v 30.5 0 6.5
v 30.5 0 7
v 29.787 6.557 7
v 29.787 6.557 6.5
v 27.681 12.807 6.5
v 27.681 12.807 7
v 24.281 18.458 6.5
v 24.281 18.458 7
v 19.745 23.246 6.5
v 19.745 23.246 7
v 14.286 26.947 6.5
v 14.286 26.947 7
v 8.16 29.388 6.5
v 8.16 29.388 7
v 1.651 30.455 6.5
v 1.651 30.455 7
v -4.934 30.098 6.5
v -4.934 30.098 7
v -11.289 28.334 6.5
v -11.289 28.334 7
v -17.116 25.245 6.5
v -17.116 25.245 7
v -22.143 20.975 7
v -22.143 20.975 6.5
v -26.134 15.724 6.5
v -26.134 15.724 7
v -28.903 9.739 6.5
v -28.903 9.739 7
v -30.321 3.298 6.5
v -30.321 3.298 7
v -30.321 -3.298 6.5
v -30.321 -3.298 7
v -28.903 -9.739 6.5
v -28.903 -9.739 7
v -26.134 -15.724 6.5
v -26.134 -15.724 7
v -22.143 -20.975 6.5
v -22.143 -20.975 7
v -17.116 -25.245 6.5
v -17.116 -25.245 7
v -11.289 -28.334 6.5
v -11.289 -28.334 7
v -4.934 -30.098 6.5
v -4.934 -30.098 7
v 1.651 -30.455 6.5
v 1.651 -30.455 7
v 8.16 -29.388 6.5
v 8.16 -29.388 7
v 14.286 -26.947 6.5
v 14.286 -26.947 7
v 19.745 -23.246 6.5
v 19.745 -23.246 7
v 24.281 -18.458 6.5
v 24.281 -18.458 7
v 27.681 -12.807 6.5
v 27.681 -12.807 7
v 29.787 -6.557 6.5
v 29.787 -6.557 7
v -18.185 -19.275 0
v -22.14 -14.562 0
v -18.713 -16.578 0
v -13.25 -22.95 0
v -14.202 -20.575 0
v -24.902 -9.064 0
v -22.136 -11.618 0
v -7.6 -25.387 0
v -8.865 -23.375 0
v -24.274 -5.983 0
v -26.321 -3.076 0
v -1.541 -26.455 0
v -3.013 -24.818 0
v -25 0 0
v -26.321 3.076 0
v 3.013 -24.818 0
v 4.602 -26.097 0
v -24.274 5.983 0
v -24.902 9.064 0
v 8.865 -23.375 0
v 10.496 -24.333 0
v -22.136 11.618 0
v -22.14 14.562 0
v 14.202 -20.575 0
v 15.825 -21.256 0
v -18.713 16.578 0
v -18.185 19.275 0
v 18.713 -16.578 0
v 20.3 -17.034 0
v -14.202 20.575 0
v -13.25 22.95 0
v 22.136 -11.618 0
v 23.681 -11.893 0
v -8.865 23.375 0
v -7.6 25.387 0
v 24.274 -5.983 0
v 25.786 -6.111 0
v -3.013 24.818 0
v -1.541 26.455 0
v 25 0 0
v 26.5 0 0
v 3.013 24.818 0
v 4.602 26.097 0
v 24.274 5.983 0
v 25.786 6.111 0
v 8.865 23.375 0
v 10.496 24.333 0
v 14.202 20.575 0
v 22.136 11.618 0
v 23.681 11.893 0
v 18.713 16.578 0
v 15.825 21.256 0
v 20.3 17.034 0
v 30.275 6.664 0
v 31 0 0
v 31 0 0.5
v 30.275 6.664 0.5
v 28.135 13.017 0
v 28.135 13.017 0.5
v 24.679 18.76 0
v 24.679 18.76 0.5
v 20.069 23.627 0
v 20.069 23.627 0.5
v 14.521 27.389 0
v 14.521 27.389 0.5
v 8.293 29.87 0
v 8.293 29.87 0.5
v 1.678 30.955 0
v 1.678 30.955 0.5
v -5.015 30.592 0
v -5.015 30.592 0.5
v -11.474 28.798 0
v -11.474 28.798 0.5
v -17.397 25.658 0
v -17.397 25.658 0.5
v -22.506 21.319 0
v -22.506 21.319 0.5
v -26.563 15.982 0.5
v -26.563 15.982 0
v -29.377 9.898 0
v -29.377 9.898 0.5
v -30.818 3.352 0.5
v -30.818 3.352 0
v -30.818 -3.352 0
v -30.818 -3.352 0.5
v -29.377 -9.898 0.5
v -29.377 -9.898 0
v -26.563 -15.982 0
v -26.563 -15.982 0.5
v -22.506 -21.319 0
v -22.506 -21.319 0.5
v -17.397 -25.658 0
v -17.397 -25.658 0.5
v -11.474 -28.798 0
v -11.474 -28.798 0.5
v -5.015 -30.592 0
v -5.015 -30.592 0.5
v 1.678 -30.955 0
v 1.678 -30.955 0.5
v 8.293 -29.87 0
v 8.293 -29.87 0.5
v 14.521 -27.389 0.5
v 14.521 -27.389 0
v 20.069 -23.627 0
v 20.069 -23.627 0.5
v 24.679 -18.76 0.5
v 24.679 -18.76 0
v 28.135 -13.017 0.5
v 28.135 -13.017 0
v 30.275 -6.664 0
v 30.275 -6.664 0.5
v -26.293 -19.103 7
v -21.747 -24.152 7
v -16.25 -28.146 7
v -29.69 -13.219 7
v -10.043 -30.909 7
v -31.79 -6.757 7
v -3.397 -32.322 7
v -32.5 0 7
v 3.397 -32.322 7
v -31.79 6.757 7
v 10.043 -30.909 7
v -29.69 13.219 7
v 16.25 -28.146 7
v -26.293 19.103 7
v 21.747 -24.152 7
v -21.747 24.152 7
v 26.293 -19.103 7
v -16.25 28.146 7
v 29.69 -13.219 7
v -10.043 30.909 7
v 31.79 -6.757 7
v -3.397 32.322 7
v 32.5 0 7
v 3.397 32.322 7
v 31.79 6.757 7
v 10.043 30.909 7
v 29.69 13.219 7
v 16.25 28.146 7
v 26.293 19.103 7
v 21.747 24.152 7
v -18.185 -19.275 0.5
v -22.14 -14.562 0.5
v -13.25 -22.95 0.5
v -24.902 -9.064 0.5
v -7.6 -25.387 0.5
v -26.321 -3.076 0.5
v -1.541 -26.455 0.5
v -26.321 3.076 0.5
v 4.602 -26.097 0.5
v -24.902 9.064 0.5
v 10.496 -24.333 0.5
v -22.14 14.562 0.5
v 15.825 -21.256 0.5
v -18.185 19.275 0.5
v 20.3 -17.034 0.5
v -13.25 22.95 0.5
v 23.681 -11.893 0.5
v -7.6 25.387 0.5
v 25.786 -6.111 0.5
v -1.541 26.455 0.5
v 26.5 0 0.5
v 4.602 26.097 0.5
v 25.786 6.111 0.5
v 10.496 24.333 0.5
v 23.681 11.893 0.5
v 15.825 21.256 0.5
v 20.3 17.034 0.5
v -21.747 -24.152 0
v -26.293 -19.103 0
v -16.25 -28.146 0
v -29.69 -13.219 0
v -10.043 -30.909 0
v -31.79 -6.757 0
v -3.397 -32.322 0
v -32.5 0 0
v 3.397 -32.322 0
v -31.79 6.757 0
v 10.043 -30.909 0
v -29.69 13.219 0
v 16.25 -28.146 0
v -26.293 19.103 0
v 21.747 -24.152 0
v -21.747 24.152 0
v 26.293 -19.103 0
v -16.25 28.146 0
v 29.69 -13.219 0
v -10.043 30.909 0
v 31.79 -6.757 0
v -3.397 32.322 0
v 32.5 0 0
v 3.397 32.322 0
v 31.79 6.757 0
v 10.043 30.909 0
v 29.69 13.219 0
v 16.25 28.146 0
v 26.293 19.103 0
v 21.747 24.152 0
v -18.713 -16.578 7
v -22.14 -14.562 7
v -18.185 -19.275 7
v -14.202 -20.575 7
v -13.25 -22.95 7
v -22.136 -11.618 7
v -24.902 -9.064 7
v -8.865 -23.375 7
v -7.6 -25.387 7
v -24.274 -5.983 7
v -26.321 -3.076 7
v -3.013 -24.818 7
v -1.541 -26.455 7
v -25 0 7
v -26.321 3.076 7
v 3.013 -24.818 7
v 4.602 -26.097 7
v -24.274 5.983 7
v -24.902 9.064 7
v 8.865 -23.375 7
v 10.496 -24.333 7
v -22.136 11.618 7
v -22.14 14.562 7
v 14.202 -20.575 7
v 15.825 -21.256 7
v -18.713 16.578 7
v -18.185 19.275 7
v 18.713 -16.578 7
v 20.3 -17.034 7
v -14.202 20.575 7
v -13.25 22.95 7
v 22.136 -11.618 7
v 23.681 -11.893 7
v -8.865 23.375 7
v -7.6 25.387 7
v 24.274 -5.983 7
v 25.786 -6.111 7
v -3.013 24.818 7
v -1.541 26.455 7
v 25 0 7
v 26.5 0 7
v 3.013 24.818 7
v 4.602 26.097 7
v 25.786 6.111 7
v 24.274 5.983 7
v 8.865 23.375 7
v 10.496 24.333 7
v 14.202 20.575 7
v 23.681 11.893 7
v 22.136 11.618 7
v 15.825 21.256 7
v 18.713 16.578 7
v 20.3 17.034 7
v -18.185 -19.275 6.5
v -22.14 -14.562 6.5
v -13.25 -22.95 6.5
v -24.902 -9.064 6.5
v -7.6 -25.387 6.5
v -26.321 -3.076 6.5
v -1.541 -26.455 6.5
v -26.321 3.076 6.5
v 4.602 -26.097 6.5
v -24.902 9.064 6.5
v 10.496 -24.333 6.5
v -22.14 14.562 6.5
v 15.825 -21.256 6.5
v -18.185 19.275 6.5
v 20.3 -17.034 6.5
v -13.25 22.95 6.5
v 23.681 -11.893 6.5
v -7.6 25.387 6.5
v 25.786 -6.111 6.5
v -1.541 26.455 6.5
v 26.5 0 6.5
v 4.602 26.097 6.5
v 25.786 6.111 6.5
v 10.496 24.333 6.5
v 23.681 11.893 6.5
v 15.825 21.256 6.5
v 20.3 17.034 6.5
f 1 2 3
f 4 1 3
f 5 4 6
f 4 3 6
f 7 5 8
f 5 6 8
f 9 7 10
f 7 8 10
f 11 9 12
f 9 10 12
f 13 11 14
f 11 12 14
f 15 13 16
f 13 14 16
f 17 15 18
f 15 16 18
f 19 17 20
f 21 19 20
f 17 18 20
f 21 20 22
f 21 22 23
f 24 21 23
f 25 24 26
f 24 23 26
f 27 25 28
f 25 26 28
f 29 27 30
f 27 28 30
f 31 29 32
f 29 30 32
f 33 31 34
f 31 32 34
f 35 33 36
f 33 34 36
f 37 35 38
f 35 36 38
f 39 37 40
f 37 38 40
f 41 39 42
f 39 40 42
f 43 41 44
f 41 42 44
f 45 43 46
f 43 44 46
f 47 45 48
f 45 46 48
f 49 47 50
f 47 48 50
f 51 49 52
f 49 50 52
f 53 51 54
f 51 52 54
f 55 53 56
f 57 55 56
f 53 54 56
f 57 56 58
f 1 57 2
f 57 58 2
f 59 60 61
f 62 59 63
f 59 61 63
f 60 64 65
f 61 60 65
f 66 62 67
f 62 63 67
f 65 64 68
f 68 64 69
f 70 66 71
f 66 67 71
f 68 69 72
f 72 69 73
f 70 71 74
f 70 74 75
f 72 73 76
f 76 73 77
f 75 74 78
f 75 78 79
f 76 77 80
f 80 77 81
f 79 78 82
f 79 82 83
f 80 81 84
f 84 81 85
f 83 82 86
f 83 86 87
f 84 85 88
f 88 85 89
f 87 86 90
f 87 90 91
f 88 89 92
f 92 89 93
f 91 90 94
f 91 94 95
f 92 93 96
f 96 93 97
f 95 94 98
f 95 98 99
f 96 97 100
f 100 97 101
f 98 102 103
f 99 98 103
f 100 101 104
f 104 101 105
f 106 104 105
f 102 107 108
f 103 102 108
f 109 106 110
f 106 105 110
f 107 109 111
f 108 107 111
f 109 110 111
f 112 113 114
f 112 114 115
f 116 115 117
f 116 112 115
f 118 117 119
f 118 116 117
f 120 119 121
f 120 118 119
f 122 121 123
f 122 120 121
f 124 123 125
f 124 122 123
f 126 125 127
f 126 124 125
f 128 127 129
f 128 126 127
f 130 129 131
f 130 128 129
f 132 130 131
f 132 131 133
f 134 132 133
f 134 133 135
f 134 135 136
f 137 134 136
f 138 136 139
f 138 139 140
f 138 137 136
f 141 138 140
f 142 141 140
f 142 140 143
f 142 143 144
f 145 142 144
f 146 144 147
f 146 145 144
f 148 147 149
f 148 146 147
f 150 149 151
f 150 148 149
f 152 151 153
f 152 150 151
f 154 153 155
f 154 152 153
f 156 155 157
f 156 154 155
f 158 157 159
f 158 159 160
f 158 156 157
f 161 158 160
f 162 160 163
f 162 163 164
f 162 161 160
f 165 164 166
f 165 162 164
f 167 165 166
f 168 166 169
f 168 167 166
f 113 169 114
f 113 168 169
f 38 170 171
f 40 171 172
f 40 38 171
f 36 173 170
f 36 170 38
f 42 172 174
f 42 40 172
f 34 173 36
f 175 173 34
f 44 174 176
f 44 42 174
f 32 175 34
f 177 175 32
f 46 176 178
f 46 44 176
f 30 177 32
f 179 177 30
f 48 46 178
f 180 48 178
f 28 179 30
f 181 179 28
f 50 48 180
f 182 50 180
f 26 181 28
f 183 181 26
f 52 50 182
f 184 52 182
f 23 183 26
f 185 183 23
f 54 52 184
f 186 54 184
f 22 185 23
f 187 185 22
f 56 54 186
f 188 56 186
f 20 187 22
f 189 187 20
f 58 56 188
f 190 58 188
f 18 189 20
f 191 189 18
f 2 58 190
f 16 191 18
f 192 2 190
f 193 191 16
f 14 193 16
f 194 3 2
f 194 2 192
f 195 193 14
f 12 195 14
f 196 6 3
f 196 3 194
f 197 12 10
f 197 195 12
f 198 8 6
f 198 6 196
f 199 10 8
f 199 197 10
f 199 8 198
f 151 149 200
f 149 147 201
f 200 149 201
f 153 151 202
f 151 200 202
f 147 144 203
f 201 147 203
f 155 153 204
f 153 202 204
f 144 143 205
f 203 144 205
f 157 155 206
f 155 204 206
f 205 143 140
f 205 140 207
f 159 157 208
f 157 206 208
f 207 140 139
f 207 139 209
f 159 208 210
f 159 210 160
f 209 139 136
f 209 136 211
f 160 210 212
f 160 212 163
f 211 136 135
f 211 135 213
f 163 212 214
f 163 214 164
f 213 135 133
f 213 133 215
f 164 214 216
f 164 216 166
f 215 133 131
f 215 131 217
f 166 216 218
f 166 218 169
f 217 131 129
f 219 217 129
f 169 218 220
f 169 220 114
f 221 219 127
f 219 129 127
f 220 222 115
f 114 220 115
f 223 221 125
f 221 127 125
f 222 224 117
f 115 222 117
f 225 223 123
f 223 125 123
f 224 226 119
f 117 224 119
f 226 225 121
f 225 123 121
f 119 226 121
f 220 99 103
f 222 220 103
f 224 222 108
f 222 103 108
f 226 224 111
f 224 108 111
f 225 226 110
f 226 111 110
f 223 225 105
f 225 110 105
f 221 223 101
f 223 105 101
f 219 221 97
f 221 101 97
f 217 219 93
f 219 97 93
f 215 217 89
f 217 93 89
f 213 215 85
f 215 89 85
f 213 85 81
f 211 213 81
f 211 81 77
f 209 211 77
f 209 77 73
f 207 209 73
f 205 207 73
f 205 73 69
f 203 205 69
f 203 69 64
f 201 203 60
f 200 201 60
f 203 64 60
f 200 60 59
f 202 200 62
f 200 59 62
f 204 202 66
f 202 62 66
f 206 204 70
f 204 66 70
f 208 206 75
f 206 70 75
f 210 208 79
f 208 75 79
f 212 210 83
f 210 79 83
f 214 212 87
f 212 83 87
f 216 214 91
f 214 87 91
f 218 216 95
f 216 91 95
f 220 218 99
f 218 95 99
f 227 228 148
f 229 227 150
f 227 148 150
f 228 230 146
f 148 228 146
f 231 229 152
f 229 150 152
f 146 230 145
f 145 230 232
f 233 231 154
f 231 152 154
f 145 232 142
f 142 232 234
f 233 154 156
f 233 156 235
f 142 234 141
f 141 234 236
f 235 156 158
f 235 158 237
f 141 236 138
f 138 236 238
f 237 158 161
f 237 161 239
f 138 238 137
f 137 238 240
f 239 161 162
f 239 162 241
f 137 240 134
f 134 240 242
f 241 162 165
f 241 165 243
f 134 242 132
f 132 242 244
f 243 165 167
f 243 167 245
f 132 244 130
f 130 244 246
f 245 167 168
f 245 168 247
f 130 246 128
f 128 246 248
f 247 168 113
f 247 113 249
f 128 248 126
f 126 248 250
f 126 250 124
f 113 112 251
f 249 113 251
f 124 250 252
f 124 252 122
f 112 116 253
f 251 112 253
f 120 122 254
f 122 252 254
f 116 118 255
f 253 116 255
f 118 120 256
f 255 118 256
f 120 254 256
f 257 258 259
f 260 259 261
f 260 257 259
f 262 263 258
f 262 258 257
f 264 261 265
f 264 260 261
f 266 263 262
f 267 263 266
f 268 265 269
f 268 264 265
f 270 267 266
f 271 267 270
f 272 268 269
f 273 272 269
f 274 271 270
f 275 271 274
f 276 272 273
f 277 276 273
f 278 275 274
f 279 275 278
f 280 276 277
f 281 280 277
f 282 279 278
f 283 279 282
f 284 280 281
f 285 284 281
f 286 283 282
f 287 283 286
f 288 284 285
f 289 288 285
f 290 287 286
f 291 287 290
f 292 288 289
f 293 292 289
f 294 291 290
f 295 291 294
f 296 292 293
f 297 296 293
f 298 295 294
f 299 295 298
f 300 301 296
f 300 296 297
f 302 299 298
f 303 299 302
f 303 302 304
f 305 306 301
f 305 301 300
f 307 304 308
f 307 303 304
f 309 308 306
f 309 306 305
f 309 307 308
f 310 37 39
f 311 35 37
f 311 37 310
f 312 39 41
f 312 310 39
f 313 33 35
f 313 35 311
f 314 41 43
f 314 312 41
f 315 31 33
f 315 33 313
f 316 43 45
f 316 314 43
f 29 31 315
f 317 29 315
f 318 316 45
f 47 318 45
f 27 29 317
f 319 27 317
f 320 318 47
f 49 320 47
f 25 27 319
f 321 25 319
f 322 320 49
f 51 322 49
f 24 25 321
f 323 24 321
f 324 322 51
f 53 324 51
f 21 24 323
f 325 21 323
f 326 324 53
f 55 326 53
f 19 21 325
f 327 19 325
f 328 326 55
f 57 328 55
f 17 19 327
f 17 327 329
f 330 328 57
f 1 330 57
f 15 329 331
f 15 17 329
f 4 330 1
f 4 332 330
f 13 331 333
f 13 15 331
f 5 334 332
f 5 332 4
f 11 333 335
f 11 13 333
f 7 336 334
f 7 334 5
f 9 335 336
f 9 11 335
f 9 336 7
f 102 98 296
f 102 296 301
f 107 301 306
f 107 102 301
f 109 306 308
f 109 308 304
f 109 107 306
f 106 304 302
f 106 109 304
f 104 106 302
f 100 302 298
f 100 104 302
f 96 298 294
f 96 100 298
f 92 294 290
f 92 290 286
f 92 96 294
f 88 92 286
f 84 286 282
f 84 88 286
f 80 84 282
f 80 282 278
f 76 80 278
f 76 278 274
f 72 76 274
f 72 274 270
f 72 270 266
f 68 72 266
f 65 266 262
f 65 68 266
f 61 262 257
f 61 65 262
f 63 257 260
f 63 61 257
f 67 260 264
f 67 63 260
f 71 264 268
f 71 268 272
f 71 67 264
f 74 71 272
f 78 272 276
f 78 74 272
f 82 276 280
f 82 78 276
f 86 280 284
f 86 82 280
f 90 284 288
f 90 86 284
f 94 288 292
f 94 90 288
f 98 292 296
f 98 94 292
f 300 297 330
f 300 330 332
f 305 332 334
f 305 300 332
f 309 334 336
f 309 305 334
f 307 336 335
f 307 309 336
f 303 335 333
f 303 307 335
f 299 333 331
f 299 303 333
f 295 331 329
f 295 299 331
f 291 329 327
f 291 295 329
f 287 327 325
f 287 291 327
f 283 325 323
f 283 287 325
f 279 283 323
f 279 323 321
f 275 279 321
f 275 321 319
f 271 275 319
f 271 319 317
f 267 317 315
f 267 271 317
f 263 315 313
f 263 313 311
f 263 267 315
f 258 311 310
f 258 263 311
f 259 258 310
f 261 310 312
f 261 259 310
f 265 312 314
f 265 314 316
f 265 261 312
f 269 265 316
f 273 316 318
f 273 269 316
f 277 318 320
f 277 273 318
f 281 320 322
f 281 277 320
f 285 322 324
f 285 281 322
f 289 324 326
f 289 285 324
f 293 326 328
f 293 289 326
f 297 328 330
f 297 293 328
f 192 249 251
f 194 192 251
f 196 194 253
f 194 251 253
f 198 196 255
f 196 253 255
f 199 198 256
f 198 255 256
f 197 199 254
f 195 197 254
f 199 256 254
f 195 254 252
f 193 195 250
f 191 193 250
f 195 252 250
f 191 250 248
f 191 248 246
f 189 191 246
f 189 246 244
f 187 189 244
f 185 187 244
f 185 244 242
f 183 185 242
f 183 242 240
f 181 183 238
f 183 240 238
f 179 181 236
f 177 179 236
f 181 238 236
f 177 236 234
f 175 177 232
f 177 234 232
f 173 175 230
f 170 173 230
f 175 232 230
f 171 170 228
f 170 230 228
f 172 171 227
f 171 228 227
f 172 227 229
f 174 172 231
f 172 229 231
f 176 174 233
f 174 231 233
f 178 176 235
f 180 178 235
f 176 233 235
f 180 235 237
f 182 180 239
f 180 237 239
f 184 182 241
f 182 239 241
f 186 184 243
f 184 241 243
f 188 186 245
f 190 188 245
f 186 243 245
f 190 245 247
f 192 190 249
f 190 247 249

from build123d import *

# Parameters (mm, degrees)
SKETCH010_R     = 32.5
SKETCH010_R_2   = 25
PAD007_DEPTH    = 7
SKETCH011_R     = 30.5
SKETCH011_R_2   = 26.5
POCKET004_DEPTH = 0.5
SKETCH012_R     = 31
SKETCH012_R_2   = 26.5
POCKET005_DEPTH = 0.5


with BuildPart() as part:
    # Sketch010 → Pad007 (new body)
    with BuildSketch(Plane.XY):
        Circle(SKETCH010_R)
        Circle(SKETCH010_R_2, mode=Mode.SUBTRACT)
    extrude(amount=PAD007_DEPTH)

    # Sketch011 → Pocket004 (cut)
    with BuildSketch(Plane.XY.offset(7)):
        Circle(SKETCH011_R)
        Circle(SKETCH011_R_2, mode=Mode.SUBTRACT)
    extrude(amount=-POCKET004_DEPTH, mode=Mode.SUBTRACT)

    # Sketch012 → Pocket005 (cut)
    with BuildSketch(Plane.XY):
        Circle(SKETCH012_R)
        Circle(SKETCH012_R_2, mode=Mode.SUBTRACT)
    extrude(amount=POCKET005_DEPTH, mode=Mode.SUBTRACT)


solid = part.part
